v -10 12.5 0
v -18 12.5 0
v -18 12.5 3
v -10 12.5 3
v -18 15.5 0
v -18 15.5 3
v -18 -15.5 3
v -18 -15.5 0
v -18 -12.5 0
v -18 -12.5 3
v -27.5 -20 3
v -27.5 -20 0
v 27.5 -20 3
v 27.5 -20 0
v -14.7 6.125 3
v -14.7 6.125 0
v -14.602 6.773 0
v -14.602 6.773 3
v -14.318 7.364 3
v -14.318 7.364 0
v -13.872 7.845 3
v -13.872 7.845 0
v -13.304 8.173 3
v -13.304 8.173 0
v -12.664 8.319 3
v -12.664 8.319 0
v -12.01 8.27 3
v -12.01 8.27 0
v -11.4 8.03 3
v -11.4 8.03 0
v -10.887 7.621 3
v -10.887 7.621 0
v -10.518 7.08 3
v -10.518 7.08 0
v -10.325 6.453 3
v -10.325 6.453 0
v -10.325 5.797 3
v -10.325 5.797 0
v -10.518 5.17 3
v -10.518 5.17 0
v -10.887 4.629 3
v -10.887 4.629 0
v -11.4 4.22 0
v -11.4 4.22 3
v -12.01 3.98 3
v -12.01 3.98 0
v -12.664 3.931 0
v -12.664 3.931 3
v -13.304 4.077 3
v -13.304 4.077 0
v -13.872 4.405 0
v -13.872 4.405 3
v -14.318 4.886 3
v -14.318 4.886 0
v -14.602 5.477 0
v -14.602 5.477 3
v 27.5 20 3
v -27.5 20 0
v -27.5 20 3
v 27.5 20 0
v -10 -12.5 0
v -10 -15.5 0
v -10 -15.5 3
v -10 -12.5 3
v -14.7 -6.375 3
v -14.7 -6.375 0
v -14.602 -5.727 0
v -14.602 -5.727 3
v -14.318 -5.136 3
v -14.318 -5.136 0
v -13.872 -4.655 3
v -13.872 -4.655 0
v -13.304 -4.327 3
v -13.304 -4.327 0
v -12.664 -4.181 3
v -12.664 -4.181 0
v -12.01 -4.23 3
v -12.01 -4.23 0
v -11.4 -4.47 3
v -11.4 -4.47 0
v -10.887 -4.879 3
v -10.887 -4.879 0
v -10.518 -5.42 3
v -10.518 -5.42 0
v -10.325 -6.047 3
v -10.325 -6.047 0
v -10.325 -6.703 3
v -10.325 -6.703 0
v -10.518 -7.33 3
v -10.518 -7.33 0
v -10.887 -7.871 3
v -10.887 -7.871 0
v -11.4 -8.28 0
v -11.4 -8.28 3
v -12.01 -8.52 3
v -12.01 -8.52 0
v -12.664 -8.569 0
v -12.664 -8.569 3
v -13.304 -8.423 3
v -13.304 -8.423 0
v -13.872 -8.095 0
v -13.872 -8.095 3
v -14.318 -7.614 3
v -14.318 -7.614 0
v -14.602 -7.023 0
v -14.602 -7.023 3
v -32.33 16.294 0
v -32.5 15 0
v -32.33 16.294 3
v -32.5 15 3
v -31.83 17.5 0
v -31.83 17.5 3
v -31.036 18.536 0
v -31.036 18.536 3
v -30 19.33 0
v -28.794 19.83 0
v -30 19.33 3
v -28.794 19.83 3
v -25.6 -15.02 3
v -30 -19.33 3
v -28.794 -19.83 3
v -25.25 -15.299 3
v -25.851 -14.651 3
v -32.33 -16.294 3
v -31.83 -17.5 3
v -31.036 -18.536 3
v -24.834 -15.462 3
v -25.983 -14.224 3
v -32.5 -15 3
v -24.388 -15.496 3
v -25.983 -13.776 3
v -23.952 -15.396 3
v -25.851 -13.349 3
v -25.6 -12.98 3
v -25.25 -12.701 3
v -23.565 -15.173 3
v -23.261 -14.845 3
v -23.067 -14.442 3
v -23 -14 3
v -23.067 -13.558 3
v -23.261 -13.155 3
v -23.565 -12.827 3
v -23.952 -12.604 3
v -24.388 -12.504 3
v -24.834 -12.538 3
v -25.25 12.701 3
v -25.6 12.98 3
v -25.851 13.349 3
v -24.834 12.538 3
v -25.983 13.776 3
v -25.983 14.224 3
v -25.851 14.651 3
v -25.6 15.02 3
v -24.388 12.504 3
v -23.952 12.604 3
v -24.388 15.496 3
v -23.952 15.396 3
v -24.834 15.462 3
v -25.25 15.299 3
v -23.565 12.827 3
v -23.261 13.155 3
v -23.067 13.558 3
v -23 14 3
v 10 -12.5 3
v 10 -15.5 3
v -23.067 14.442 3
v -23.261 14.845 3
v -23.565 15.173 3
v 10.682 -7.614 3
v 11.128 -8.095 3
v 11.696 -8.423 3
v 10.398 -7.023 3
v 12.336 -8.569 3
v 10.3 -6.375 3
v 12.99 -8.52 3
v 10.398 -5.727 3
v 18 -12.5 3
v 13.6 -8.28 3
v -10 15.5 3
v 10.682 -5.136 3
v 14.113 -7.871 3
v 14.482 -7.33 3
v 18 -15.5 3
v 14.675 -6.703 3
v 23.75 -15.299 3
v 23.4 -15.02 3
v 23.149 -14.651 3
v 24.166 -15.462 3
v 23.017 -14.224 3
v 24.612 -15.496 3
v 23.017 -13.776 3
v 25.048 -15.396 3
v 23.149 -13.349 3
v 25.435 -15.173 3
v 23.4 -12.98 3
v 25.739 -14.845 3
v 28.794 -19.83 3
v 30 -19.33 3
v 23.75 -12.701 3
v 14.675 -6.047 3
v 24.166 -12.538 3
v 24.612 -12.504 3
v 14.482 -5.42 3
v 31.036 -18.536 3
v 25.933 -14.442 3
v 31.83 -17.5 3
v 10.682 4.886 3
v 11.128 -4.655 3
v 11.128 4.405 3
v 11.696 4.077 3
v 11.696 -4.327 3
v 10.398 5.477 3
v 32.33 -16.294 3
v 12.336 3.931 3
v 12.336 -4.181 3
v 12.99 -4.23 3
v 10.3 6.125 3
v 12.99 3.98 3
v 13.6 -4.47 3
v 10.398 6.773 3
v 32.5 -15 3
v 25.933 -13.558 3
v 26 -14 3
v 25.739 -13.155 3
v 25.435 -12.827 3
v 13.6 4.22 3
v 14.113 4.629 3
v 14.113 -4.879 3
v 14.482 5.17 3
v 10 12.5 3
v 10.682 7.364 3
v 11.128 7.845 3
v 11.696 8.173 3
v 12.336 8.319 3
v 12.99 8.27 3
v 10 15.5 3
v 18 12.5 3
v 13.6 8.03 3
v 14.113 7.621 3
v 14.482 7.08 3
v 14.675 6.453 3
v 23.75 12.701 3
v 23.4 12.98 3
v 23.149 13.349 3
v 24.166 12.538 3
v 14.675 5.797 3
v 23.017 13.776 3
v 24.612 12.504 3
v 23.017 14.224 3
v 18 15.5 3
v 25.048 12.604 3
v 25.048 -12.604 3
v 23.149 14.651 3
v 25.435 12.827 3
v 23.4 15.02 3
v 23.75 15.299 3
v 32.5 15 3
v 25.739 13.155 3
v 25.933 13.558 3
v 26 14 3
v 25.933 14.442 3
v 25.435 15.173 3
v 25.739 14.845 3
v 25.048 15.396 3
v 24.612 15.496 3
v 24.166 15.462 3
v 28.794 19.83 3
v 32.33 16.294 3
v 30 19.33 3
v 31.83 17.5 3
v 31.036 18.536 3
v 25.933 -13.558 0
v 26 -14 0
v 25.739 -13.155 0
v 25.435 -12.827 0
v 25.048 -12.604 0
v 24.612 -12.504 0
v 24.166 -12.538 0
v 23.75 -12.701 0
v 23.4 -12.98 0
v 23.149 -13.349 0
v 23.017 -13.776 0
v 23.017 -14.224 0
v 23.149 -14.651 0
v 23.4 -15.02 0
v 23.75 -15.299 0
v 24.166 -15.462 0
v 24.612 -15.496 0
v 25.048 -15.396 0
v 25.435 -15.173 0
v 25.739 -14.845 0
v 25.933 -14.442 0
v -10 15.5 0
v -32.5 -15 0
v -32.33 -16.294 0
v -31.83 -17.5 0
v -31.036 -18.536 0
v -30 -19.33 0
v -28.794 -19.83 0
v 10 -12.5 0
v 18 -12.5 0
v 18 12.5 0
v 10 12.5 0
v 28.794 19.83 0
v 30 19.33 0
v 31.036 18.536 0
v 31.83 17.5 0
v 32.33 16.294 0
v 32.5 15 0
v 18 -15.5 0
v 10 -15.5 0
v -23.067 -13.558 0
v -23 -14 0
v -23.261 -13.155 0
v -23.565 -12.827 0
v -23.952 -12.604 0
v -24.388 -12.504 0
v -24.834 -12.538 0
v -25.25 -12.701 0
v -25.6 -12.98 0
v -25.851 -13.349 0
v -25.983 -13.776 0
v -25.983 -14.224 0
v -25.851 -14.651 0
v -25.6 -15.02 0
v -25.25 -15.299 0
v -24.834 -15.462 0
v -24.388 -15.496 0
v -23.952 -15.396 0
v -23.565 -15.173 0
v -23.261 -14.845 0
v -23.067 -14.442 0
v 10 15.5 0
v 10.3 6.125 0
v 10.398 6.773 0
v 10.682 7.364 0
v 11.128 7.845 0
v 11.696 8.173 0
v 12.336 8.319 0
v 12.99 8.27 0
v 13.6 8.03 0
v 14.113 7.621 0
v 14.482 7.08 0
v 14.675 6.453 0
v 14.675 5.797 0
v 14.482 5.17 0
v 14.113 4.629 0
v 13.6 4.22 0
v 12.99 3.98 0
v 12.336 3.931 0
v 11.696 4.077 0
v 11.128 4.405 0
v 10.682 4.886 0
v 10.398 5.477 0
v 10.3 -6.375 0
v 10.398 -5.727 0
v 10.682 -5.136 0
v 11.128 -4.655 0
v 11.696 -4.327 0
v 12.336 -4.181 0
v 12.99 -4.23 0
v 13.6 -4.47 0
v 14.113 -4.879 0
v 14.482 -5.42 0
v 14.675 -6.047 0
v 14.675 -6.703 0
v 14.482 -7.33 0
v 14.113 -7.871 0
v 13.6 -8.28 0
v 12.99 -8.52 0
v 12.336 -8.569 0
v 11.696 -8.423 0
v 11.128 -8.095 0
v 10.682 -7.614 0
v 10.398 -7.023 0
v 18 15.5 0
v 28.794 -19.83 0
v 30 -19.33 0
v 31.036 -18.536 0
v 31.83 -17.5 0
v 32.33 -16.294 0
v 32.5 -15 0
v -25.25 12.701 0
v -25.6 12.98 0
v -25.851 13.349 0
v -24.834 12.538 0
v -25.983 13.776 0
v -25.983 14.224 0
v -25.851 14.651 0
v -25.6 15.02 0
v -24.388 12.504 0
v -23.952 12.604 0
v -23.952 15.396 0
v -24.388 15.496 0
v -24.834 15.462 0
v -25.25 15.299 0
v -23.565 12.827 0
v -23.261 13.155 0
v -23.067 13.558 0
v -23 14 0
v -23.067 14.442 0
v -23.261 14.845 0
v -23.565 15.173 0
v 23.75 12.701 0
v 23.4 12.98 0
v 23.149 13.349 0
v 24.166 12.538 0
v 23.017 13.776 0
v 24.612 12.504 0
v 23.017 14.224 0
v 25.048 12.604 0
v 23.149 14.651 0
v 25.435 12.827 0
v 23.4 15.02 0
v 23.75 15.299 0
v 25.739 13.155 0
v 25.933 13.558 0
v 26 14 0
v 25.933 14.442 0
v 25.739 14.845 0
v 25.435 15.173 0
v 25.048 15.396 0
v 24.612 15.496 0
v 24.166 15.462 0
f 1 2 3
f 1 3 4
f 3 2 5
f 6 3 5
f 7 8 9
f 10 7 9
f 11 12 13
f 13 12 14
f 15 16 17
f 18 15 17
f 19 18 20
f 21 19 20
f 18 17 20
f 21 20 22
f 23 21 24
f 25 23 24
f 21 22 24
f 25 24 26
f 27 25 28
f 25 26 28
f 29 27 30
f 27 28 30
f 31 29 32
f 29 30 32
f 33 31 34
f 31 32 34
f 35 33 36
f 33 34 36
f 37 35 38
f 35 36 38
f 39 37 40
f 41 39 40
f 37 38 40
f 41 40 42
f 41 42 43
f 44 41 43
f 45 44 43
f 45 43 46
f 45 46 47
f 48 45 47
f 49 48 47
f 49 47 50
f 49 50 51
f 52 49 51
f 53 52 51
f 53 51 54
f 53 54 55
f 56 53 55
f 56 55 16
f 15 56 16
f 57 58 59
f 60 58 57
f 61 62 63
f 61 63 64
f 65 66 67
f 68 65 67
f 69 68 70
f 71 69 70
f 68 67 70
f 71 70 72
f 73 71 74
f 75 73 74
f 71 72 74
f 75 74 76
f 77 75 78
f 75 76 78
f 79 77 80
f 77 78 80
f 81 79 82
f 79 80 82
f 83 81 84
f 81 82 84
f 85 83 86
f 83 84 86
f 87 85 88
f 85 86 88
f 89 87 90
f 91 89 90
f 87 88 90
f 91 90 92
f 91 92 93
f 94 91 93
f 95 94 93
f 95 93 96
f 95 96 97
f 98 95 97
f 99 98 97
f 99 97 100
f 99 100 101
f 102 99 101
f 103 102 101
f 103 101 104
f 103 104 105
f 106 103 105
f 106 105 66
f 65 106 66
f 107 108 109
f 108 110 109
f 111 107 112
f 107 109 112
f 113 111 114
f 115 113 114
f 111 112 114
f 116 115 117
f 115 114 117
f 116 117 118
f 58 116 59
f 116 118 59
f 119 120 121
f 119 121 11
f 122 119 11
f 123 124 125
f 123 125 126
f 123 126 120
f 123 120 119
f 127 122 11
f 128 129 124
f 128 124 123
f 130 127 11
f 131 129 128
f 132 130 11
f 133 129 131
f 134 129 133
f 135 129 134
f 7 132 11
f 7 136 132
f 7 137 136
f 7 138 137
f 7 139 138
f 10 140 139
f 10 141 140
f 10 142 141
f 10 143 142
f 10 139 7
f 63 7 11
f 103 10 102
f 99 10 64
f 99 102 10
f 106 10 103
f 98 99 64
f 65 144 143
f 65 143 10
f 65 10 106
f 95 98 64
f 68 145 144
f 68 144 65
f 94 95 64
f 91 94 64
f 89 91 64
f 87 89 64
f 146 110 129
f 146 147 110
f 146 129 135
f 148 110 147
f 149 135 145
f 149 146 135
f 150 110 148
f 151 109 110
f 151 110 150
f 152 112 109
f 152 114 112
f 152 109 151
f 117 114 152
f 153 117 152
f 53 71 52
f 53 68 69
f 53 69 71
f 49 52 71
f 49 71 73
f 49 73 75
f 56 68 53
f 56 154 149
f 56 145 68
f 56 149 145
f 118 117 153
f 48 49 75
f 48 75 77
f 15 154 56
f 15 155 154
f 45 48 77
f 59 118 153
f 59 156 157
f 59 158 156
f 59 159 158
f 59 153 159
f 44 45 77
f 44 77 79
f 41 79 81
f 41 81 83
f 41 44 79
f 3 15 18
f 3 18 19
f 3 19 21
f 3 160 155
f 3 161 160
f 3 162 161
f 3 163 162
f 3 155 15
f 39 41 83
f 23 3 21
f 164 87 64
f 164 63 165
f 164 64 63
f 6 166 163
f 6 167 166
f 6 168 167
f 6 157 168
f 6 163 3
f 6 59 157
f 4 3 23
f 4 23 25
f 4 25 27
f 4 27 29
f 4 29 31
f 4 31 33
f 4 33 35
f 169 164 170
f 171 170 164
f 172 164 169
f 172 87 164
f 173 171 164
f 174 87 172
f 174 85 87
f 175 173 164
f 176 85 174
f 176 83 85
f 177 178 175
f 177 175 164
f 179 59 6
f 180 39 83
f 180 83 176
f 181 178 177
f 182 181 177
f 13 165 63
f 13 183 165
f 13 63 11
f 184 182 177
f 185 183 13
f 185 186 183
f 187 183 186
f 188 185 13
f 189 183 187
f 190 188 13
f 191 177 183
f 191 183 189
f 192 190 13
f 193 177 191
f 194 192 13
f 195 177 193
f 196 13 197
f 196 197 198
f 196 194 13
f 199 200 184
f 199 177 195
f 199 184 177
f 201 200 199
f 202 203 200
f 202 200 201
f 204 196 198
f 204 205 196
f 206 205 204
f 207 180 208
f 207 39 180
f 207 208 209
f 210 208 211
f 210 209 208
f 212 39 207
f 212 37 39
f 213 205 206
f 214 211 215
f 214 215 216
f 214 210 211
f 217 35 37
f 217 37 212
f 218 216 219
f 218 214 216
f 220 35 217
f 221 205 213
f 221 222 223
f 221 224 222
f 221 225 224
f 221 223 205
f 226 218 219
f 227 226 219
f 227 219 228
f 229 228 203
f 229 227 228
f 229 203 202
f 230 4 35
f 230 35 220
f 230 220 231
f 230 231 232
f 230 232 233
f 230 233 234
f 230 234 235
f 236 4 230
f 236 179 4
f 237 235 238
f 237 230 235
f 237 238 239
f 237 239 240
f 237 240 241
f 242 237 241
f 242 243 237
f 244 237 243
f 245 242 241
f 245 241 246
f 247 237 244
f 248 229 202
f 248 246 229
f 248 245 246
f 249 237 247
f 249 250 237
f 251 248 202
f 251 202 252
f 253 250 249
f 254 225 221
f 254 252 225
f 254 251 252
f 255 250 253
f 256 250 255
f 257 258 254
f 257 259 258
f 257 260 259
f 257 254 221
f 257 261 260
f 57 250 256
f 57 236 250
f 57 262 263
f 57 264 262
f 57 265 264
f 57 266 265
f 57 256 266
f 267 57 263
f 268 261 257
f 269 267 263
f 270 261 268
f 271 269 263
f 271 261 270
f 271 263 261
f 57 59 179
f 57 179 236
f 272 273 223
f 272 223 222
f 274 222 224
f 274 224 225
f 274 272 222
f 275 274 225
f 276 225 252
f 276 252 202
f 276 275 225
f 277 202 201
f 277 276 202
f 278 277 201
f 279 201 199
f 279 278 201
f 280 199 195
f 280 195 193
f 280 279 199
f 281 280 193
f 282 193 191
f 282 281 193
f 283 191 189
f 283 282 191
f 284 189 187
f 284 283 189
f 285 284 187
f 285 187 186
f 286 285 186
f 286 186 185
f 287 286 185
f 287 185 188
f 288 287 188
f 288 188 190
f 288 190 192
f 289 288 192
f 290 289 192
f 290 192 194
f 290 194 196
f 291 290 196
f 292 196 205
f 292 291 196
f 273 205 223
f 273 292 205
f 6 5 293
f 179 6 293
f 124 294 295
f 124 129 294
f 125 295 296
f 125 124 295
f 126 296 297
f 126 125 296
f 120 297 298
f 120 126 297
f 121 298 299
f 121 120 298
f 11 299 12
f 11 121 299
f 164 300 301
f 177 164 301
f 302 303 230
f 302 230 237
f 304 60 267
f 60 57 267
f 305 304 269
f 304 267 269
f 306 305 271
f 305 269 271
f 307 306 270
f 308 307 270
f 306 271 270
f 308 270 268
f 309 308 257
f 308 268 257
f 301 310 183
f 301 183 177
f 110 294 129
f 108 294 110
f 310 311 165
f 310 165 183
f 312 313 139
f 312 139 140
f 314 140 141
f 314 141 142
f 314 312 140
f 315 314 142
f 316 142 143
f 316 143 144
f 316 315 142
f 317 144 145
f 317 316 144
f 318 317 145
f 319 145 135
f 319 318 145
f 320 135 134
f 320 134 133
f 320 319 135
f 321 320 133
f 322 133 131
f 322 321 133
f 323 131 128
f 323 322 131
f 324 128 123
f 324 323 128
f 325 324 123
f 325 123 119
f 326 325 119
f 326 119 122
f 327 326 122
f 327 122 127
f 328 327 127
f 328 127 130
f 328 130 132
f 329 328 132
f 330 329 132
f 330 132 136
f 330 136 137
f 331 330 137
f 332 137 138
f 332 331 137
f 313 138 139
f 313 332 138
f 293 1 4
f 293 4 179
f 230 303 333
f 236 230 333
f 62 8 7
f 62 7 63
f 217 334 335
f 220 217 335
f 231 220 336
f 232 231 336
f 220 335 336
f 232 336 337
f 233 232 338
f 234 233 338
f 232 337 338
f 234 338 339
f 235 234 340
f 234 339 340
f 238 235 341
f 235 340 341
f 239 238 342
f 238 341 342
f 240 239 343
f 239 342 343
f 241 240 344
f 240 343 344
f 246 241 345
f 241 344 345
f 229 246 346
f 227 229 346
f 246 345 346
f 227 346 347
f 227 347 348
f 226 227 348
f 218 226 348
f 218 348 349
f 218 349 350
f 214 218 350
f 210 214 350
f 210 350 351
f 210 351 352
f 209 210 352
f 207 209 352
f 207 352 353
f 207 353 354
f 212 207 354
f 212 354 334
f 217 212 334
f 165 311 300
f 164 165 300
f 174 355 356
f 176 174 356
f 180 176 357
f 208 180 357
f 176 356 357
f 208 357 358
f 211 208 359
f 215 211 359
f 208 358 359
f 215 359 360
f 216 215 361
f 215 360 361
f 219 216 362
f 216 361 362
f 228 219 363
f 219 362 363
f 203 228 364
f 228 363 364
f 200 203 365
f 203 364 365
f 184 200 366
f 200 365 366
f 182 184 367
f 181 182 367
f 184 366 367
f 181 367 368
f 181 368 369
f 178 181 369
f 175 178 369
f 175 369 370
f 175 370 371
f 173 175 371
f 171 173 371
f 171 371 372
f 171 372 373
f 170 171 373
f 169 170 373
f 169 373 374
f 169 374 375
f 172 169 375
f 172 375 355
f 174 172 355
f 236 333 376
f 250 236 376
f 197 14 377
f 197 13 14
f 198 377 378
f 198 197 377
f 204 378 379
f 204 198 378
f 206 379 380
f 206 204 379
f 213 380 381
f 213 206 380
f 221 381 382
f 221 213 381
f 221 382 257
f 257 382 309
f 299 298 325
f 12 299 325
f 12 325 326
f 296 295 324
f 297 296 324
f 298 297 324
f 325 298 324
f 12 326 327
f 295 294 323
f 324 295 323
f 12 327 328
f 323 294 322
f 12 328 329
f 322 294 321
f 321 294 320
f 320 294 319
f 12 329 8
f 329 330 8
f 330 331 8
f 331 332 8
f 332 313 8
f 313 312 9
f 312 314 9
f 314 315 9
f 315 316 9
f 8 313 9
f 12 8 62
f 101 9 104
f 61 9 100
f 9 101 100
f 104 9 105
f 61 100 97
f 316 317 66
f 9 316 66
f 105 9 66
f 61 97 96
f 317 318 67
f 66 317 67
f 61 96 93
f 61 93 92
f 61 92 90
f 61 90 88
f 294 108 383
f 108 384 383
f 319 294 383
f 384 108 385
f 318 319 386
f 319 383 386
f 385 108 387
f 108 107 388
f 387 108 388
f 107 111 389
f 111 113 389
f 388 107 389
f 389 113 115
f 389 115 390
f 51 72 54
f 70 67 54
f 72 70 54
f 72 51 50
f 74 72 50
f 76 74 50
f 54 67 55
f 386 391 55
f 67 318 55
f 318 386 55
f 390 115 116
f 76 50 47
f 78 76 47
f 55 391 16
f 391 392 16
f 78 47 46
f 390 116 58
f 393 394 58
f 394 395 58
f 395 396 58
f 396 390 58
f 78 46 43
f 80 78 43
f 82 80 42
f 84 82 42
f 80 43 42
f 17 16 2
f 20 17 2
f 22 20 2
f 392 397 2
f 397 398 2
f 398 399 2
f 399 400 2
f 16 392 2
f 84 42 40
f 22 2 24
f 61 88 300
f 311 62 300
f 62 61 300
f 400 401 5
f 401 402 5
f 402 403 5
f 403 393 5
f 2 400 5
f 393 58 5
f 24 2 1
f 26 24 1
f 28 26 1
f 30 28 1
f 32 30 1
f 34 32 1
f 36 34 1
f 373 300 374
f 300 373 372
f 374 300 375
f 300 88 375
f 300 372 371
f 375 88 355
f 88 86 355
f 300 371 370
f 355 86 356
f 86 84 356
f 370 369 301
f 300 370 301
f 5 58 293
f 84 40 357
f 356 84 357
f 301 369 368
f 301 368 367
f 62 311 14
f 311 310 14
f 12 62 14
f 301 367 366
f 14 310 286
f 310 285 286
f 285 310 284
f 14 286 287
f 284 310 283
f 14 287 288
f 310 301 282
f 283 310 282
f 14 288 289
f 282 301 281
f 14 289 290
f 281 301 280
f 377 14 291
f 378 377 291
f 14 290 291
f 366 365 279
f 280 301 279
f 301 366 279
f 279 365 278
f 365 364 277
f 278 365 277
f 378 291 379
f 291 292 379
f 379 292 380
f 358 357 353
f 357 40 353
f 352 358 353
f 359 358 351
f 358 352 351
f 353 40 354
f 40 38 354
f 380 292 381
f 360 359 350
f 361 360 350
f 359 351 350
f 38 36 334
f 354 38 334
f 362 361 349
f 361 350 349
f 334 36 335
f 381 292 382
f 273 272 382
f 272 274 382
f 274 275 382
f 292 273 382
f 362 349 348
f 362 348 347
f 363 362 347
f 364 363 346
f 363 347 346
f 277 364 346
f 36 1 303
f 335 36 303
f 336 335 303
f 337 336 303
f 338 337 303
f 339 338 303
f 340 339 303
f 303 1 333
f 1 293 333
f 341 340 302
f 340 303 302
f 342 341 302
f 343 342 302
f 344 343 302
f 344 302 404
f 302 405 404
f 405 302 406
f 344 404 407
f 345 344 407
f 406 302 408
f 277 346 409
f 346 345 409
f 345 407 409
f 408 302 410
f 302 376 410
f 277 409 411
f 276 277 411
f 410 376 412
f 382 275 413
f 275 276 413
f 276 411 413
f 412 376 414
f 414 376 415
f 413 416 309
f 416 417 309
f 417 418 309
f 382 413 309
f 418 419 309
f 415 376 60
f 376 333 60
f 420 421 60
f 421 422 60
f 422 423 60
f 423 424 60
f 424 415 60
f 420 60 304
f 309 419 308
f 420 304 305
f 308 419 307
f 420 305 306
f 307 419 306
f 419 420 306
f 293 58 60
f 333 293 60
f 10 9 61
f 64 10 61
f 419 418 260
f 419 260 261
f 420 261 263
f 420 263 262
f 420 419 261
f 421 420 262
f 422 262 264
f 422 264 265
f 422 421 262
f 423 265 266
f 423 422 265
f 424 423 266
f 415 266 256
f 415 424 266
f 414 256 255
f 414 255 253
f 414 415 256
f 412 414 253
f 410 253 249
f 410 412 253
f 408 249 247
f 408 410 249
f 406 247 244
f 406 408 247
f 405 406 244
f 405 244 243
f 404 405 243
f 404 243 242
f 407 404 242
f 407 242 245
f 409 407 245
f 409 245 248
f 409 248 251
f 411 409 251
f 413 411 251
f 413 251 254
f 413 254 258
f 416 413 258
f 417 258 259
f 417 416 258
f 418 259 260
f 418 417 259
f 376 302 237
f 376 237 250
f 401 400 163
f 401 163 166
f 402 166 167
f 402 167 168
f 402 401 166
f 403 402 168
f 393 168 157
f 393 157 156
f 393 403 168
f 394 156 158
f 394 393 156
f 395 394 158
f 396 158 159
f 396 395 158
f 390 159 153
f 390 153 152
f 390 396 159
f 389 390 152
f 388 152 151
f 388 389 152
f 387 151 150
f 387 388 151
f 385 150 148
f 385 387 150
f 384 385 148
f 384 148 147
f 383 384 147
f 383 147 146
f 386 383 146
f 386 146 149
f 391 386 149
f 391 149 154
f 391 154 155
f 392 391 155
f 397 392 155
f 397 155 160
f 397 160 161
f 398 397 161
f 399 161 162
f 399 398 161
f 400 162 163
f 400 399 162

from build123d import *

# Parameters (mm, degrees)
F1_W     = 65
F1_H     = 40
F1_R     = 1.5
F1_W_2   = 8
F1_H_2   = 3
F2_DEPTH = 3
F3_R     = 5
F5_D     = 4.4


with BuildPart() as f2:
    # F1 (on Top) → F2 (new body)
    with BuildSketch(Plane.XY):
        Rectangle(F1_W, F1_H)
        with Locations((-24.5, -14)):
            Circle(F1_R, mode=Mode.SUBTRACT)
        with Locations((-14, -14)):
            Rectangle(F1_W_2, F1_H_2, mode=Mode.SUBTRACT)
        with Locations((14, -14)):
            Rectangle(F1_W_2, F1_H_2, mode=Mode.SUBTRACT)
        with Locations((24.5, -14)):
            Circle(F1_R, mode=Mode.SUBTRACT)
        with Locations((-24.5, 14)):
            Circle(F1_R, mode=Mode.SUBTRACT)
        with Locations((-14, 14)):
            Rectangle(F1_W_2, F1_H_2, mode=Mode.SUBTRACT)
        with Locations((14, 14)):
            Rectangle(F1_W_2, F1_H_2, mode=Mode.SUBTRACT)
        with Locations((24.5, 14)):
            Circle(F1_R, mode=Mode.SUBTRACT)
    extrude(amount=F2_DEPTH)

    # F3
    f3_edges = [f2.edges().sort_by_distance(p)[0] for p in [
        (-32.5, -20, 1.5),
        (-32.5, 20, 1.5),
        (32.5, -20, 1.5),
        (32.5, 20, 1.5),
    ]]
    fillet(f3_edges, radius=F3_R)

    # F5 (through all)
    with Locations(Plane.XY.offset(3)):
        with Locations((-12.5, 6.125), (-12.5, -6.375), (12.5, 6.125), (12.5, -6.375)):
            Hole(F5_D / 2)


solid = f2.part
